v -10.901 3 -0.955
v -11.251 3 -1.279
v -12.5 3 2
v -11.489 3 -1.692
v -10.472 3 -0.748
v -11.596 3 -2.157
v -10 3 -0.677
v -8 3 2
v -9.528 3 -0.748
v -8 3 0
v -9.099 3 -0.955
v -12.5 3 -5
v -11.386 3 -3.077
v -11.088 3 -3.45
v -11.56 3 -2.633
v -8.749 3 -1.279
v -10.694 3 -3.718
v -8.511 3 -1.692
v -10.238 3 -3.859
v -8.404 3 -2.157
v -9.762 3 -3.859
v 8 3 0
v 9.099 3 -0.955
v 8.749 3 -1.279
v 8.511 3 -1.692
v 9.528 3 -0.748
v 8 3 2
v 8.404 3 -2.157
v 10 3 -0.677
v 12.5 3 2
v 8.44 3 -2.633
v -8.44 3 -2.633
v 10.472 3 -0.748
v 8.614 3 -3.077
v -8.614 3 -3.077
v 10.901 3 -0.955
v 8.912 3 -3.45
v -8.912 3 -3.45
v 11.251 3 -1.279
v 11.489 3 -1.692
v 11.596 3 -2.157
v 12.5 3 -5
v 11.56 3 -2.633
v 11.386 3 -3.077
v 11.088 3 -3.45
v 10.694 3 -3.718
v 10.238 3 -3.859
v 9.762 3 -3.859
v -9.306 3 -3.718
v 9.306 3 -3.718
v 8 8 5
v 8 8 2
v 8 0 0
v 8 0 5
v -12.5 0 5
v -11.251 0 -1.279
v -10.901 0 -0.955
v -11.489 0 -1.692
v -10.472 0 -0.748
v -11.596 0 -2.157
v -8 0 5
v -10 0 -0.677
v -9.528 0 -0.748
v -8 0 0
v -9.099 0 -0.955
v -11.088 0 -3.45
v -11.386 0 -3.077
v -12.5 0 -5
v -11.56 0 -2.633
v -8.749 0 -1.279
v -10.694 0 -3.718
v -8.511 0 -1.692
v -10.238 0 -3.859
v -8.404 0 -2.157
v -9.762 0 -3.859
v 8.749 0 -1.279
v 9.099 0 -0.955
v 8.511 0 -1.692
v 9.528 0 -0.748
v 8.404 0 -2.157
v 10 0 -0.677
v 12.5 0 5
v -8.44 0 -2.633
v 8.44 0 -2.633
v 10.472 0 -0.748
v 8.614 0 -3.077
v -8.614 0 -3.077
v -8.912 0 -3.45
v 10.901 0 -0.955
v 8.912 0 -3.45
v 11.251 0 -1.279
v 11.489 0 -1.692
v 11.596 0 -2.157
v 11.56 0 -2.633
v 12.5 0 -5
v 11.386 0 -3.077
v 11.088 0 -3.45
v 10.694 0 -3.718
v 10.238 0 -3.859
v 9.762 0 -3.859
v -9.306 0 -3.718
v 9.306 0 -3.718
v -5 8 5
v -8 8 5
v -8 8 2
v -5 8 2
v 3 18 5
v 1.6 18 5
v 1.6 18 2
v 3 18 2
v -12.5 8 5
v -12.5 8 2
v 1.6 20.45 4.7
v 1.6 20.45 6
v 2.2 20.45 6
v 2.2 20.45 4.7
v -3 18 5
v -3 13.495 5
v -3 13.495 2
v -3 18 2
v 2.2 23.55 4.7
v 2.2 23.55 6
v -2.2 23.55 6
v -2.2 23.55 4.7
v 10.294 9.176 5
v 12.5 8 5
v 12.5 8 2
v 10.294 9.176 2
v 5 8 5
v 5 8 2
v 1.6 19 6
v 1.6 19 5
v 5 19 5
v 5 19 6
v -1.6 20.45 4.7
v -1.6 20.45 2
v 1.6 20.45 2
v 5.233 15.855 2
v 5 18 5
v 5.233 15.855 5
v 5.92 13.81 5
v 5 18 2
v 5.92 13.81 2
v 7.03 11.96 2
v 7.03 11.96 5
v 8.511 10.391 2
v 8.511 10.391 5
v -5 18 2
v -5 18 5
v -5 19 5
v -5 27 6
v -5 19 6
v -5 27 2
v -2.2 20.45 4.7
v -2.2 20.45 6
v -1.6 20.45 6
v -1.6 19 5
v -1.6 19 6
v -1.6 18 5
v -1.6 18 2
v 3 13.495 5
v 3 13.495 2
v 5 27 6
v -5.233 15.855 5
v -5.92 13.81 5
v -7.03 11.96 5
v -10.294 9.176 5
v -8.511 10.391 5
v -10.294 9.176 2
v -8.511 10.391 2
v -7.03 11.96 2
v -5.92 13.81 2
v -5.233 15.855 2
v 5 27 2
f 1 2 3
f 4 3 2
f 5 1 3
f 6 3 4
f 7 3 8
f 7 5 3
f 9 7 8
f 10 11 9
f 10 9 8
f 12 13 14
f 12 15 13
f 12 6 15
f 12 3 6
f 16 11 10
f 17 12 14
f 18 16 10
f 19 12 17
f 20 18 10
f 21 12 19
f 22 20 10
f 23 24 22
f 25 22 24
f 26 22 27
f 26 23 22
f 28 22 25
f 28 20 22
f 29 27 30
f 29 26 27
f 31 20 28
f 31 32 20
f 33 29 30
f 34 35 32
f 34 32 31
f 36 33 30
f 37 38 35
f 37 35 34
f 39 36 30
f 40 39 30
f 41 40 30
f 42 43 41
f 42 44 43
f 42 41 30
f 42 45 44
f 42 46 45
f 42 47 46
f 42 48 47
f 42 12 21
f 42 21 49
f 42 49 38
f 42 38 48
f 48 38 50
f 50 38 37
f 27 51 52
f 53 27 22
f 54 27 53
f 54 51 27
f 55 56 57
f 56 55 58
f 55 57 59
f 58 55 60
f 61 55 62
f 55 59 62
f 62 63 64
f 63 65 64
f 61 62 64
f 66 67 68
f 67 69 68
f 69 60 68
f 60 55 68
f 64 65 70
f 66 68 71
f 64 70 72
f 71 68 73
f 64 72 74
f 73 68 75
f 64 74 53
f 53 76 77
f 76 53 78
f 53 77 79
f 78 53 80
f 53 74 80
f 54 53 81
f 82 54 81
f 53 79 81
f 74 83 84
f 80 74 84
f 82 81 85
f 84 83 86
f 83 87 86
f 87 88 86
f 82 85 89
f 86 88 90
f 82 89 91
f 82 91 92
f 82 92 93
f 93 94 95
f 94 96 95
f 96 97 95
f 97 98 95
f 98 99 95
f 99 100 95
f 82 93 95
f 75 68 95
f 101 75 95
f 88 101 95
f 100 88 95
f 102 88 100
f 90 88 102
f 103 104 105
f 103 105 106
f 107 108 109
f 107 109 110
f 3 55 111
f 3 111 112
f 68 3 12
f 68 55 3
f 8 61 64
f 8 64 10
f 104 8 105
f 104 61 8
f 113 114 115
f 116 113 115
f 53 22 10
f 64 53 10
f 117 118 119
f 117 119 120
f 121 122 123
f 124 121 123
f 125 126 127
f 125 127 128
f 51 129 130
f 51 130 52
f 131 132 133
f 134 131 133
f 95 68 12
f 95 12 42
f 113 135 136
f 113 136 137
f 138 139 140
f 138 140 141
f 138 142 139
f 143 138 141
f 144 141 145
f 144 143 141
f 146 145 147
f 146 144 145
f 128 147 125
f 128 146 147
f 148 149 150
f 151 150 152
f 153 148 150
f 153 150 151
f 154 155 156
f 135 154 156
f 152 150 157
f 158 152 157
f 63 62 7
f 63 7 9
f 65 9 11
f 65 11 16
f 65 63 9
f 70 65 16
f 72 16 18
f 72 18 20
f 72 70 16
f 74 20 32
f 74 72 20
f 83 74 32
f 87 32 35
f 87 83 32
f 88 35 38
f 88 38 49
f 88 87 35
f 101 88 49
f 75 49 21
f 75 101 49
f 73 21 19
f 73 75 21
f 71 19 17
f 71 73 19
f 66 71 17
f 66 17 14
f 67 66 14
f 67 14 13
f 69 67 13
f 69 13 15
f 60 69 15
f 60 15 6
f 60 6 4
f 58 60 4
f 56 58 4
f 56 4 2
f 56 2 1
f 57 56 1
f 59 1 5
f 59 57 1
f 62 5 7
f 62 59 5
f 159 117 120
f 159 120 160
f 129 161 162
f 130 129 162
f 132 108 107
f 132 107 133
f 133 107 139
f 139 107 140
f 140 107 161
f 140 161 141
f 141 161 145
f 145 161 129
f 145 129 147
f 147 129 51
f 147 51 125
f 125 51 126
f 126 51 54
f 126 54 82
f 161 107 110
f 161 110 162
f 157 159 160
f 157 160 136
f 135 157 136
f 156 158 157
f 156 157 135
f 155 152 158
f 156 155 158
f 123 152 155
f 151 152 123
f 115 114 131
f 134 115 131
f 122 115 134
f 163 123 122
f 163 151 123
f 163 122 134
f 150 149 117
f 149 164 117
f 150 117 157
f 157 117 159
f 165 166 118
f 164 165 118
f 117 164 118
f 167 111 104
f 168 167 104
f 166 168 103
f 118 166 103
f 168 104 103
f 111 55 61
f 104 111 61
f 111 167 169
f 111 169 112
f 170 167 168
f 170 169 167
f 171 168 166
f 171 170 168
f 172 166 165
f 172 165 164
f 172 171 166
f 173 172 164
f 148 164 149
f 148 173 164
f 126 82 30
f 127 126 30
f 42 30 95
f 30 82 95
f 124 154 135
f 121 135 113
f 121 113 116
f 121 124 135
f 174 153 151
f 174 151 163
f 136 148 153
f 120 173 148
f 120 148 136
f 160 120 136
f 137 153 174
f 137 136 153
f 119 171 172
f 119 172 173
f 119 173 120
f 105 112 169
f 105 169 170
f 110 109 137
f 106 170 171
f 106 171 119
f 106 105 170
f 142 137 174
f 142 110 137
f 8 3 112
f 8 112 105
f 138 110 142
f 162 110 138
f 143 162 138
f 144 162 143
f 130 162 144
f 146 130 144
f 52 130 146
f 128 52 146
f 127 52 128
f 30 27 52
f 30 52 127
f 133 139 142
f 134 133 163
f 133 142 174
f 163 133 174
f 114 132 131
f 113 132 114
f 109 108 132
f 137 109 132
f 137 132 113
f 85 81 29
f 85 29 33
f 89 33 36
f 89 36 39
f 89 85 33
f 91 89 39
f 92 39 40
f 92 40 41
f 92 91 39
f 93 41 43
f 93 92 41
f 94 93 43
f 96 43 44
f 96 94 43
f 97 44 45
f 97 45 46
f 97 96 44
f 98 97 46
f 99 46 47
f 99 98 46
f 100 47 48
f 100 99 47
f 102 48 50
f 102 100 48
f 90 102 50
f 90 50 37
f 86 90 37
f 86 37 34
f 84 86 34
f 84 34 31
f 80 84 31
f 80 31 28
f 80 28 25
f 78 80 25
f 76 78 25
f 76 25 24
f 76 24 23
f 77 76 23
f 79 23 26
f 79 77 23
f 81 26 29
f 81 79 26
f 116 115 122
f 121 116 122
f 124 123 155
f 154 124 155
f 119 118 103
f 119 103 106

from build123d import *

# Parameters (mm, degrees)
SKETCH7_W               = 25
SKETCH7_H               = 10
SKETCH7_R               = 1.6
BOSS_EXTRUDE3_DEPTH     = 3
SKETCH8_W               = 25
SKETCH8_H               = 3
BOSS_EXTRUDE4_DEPTH     = 24
CUT_EXTRUDE5_DEPTH      = 5
SKETCH10_OUTSIDE_W      = 34.626
SKETCH10_OUTSIDE_H      = 36.626
CUT_EXTRUDE6_DEPTH      = 5
SKETCH11_W              = 10
SKETCH11_H              = 8
BOSS_EXTRUDE5_DEPTH     = 1
CHAMFER1_SIZE           = 2
CHAMFER1_SIZE2          = 5.494954839
CHAMFER1_PART_2_SIZE    = 2
CHAMFER1_PART_2_SIZE2   = 5.494954839
CUT_EXTRUDE7_DEPTH      = 1.3
SKETCH14_W              = 3.2
SKETCH14_H              = 3.813108433
CUT_EXTRUDE9_DEPTH      = 2.3
CUT_EXTRUDE9_DEPTH_BACK = 10.7
FILLET3_R               = 10


with BuildPart() as part:
    # Sketch7 → Boss-Extrude3 (new body)
    with BuildSketch(Plane(origin=(0, 0, 0), x_dir=(1, 0, 0), z_dir=(0, 1, 0))):
        Rectangle(SKETCH7_W, SKETCH7_H)
        with Locations(Location((-10, 2.276747262, 0), (0, 0, 270))):  # turned: the seam where the file's is
            Circle(SKETCH7_R, mode=Mode.SUBTRACT)
        with Locations(Location((10, 2.276747262, 0), (0, 0, 270))):  # turned: the seam where the file's is
            Circle(SKETCH7_R, mode=Mode.SUBTRACT)
    extrude(amount=BOSS_EXTRUDE3_DEPTH)

    # Sketch8 → Boss-Extrude4 (add)
    with BuildSketch(Plane(origin=(0, 3, 0), x_dir=(1, 0, 0), z_dir=(0, 1, 0))):
        with Locations((0, -3.5)):
            Rectangle(SKETCH8_W, SKETCH8_H)
    extrude(amount=BOSS_EXTRUDE4_DEPTH)

    # Sketch9 → Cut-Extrude5 (cut)
    with BuildSketch(Plane.XY.offset(5)):
        Polygon((8, 8), (8, 0), (-8, 0), (-8, 8), (-3, 8), (-3, 18), (3, 18), (3, 8), align=None)
    extrude(amount=-CUT_EXTRUDE5_DEPTH, mode=Mode.SUBTRACT)

    # Sketch10 outside → Cut-Extrude6 (cut)
    with BuildSketch(Plane.XY.offset(5)):
        with Locations((0, 13.5)):
            Rectangle(SKETCH10_OUTSIDE_W, SKETCH10_OUTSIDE_H)
        Polygon((-5, 27), (-5, 12), (-12.5, 8), (-12.5, 0), (12.5, 0), (12.5, 8), (5, 12), (5, 27), align=None, mode=Mode.SUBTRACT)
    extrude(amount=-CUT_EXTRUDE6_DEPTH, mode=Mode.SUBTRACT)

    # Sketch11 → Boss-Extrude5 (add)
    with BuildSketch(Plane.XY.offset(5)):
        with Locations((0, 23)):
            Rectangle(SKETCH11_W, SKETCH11_H)
    extrude(amount=BOSS_EXTRUDE5_DEPTH)

    # Chamfer1
    chamfer1_edges = [part.edges().sort_by_distance(p)[0] for p in [
        (-3, 8, 3.5),
    ]]
    chamfer1_side = [part.faces().sort_by_distance(p)[0] for p in [
        (-5.5, 8, 3.5),
    ]]
    chamfer(chamfer1_edges, length=CHAMFER1_SIZE, length2=CHAMFER1_SIZE2, reference=chamfer1_side[0])

    # Chamfer1 part 2
    chamfer1_part_2_edges = [part.edges().sort_by_distance(p)[0] for p in [
        (3, 8, 3.5),
    ]]
    chamfer1_part_2_side = [part.faces().sort_by_distance(p)[0] for p in [
        (5.5, 8, 3.5),
    ]]
    chamfer(chamfer1_part_2_edges, length=CHAMFER1_PART_2_SIZE, length2=CHAMFER1_PART_2_SIZE2, reference=chamfer1_part_2_side[0])

    # Sketch12 → Cut-Extrude7 (cut)
    with BuildSketch(Plane.XY.offset(6)):
        Polygon((-2.2, 20.45), (-1.6, 20.45), (-1.6, 19), (1.6, 19), (1.6, 20.45), (2.2, 20.45), (2.2, 23.55), (-2.2, 23.55), align=None)
    extrude(amount=-CUT_EXTRUDE7_DEPTH, mode=Mode.SUBTRACT)

    # Sketch14 → Cut-Extrude9 (cut, two sides)
    with BuildSketch(Plane.XY.offset(4.7)) as cut_extrude9_sk:
        with Locations((0, 18.543445784)):
            Rectangle(SKETCH14_W, SKETCH14_H)
    extrude(amount=CUT_EXTRUDE9_DEPTH, mode=Mode.SUBTRACT)
    extrude(cut_extrude9_sk.sketch, amount=-CUT_EXTRUDE9_DEPTH_BACK, mode=Mode.SUBTRACT)

    # Fillet3
    fillet3_edges = [part.edges().sort_by_distance(p)[0] for p in [
        (-5, 12, 3.5),
        (5, 12, 3.5),
    ]]
    fillet(fillet3_edges, radius=FILLET3_R)


solid = part.part
